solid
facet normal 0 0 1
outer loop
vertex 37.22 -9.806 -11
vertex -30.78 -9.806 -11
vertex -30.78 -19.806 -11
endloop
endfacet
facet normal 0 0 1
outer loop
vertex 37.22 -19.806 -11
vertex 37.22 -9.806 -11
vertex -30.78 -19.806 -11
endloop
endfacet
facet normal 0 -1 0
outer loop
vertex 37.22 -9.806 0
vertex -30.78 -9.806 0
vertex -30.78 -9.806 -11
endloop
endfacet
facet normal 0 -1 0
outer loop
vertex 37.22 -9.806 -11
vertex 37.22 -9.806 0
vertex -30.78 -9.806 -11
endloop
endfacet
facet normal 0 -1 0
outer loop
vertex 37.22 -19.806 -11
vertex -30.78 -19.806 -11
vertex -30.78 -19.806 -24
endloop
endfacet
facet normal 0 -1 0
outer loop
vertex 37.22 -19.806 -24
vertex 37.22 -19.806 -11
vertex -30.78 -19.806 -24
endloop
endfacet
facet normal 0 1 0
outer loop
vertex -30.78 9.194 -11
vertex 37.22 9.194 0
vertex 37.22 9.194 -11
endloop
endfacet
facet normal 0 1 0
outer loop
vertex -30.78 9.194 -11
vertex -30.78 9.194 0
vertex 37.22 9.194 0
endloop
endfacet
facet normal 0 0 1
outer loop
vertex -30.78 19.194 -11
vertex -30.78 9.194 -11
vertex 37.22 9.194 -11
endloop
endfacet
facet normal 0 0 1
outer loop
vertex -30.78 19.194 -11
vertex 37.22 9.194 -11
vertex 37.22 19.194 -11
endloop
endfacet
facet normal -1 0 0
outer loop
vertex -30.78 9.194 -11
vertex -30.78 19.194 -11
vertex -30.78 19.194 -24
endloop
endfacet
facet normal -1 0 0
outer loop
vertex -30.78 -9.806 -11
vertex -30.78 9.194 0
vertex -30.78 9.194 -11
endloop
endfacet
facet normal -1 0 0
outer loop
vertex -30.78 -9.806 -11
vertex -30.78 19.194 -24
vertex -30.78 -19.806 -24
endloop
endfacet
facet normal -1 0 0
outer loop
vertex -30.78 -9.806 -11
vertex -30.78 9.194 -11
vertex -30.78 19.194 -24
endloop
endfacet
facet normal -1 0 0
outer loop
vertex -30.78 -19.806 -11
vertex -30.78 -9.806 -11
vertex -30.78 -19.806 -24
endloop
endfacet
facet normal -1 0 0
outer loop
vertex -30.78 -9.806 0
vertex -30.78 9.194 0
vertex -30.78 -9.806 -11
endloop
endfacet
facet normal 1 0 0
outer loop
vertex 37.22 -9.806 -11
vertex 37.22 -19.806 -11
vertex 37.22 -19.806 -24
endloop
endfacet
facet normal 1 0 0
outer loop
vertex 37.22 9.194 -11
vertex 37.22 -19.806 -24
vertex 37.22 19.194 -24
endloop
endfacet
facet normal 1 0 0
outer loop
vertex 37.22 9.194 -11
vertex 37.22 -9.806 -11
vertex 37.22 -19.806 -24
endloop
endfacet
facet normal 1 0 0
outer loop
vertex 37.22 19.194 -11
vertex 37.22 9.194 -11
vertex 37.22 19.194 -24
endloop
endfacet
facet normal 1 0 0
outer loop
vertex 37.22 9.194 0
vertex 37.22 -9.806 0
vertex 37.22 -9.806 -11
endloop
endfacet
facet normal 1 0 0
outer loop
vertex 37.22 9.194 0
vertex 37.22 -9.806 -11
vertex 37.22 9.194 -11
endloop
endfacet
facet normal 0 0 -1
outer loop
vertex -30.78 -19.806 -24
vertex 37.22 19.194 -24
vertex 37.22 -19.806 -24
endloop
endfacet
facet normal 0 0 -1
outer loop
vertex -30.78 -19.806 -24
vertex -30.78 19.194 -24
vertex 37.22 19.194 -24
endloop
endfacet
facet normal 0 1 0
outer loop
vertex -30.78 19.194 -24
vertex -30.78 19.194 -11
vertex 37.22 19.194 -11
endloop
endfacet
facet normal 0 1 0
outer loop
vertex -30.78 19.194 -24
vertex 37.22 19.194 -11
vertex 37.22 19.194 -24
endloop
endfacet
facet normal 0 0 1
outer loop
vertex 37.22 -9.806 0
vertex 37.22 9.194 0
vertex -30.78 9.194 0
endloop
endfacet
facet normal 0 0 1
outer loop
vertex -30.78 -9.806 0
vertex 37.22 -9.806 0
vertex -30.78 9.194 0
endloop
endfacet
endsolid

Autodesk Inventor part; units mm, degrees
ref_plane "YZ Plane" through (0, 0, 0) normal (1, 0, 0) x (0, 1, 0)
ref_plane "XZ Plane" through (0, 0, 0) normal (0, 1, 0) x (-1, 0, 0)
ref_plane "XY Plane" through (0, 0, 0) normal (0, 0, 1) x (1, 0, 0)
sketch "Sketch1" plane through (-41, -6, 0) normal (0, 0, -1) x (-1, 0, 0)
  line L0 (-10.2196, -17.8058) -> (-78.2196, -17.8058)
  line L1 (-78.2196, -17.8058) -> (-78.2196, 29.1942)
  line L2 (-78.2196, 29.1942) -> (-10.2196, 29.1942)
  line L3 (-10.2196, 29.1942) -> (-10.2196, -17.8058)
  point P0 (-41, 6)
  dimension "d0" = 68
  dimension "d1" = 47
extrude "Extrusion4" add sketch "Sketch1" along normal blind 30
sketch "Sketch5" plane through (-30.7804, -23.8058, 0) normal (-1, 0, 0) x (0, 0, 1)
  line L0 (0, 47) -> (0, 0) projected
  line L1 (0, 0) -> (0, 14)
  line L2 (0, 47) -> (0, 33)
  line L3 (0, 14) -> (-11, 14)
  line L4 (-11, 14) -> (-11, 4)
  line L5 (0, 33) -> (-11, 33)
  line L6 (-11, 33) -> (-11, 43)
  line L7 (-11, 4) -> (-24, 4)
  line L8 (-11, 43) -> (-24, 43)
  line L9 (-24, 43) -> (-24, 4)
  line L10 (0, 14) -> (0, 33)
  line L11 (0, 14) -> (0, 0)
  line L12 (0, 0) -> (-30, 0) projected
  line L13 (-30, 47) -> (-30, 0) projected
  line L14 (-30, 0) -> (-30, 47)
  line L15 (-30, 47) -> (0, 47)
  line L16 (0, 47) -> (0, 33)
  line L17 (0, 33) -> (0, 47)
  line L18 (-30, 0) -> (0, 0)
  line L19 (0, 0) -> (0, 14)
  line L20 (0, 0) -> (0, 47)
  point P0 (0, 23.8058)
  dimension "d32" = 14
  dimension "d33" = 14
  dimension "d34" = 11
  dimension "d35" = 10
  dimension "d36" = 11
  dimension "d37" = 10
  dimension "d38" = 13
  dimension "d39" = 13
extrude "Extrusion5" cut sketch "Sketch5" against normal blind 68 contours L0 L5 L6 L8 L9 L7 L4 L3 L12 L13 L15
properties part number "Inferior"
